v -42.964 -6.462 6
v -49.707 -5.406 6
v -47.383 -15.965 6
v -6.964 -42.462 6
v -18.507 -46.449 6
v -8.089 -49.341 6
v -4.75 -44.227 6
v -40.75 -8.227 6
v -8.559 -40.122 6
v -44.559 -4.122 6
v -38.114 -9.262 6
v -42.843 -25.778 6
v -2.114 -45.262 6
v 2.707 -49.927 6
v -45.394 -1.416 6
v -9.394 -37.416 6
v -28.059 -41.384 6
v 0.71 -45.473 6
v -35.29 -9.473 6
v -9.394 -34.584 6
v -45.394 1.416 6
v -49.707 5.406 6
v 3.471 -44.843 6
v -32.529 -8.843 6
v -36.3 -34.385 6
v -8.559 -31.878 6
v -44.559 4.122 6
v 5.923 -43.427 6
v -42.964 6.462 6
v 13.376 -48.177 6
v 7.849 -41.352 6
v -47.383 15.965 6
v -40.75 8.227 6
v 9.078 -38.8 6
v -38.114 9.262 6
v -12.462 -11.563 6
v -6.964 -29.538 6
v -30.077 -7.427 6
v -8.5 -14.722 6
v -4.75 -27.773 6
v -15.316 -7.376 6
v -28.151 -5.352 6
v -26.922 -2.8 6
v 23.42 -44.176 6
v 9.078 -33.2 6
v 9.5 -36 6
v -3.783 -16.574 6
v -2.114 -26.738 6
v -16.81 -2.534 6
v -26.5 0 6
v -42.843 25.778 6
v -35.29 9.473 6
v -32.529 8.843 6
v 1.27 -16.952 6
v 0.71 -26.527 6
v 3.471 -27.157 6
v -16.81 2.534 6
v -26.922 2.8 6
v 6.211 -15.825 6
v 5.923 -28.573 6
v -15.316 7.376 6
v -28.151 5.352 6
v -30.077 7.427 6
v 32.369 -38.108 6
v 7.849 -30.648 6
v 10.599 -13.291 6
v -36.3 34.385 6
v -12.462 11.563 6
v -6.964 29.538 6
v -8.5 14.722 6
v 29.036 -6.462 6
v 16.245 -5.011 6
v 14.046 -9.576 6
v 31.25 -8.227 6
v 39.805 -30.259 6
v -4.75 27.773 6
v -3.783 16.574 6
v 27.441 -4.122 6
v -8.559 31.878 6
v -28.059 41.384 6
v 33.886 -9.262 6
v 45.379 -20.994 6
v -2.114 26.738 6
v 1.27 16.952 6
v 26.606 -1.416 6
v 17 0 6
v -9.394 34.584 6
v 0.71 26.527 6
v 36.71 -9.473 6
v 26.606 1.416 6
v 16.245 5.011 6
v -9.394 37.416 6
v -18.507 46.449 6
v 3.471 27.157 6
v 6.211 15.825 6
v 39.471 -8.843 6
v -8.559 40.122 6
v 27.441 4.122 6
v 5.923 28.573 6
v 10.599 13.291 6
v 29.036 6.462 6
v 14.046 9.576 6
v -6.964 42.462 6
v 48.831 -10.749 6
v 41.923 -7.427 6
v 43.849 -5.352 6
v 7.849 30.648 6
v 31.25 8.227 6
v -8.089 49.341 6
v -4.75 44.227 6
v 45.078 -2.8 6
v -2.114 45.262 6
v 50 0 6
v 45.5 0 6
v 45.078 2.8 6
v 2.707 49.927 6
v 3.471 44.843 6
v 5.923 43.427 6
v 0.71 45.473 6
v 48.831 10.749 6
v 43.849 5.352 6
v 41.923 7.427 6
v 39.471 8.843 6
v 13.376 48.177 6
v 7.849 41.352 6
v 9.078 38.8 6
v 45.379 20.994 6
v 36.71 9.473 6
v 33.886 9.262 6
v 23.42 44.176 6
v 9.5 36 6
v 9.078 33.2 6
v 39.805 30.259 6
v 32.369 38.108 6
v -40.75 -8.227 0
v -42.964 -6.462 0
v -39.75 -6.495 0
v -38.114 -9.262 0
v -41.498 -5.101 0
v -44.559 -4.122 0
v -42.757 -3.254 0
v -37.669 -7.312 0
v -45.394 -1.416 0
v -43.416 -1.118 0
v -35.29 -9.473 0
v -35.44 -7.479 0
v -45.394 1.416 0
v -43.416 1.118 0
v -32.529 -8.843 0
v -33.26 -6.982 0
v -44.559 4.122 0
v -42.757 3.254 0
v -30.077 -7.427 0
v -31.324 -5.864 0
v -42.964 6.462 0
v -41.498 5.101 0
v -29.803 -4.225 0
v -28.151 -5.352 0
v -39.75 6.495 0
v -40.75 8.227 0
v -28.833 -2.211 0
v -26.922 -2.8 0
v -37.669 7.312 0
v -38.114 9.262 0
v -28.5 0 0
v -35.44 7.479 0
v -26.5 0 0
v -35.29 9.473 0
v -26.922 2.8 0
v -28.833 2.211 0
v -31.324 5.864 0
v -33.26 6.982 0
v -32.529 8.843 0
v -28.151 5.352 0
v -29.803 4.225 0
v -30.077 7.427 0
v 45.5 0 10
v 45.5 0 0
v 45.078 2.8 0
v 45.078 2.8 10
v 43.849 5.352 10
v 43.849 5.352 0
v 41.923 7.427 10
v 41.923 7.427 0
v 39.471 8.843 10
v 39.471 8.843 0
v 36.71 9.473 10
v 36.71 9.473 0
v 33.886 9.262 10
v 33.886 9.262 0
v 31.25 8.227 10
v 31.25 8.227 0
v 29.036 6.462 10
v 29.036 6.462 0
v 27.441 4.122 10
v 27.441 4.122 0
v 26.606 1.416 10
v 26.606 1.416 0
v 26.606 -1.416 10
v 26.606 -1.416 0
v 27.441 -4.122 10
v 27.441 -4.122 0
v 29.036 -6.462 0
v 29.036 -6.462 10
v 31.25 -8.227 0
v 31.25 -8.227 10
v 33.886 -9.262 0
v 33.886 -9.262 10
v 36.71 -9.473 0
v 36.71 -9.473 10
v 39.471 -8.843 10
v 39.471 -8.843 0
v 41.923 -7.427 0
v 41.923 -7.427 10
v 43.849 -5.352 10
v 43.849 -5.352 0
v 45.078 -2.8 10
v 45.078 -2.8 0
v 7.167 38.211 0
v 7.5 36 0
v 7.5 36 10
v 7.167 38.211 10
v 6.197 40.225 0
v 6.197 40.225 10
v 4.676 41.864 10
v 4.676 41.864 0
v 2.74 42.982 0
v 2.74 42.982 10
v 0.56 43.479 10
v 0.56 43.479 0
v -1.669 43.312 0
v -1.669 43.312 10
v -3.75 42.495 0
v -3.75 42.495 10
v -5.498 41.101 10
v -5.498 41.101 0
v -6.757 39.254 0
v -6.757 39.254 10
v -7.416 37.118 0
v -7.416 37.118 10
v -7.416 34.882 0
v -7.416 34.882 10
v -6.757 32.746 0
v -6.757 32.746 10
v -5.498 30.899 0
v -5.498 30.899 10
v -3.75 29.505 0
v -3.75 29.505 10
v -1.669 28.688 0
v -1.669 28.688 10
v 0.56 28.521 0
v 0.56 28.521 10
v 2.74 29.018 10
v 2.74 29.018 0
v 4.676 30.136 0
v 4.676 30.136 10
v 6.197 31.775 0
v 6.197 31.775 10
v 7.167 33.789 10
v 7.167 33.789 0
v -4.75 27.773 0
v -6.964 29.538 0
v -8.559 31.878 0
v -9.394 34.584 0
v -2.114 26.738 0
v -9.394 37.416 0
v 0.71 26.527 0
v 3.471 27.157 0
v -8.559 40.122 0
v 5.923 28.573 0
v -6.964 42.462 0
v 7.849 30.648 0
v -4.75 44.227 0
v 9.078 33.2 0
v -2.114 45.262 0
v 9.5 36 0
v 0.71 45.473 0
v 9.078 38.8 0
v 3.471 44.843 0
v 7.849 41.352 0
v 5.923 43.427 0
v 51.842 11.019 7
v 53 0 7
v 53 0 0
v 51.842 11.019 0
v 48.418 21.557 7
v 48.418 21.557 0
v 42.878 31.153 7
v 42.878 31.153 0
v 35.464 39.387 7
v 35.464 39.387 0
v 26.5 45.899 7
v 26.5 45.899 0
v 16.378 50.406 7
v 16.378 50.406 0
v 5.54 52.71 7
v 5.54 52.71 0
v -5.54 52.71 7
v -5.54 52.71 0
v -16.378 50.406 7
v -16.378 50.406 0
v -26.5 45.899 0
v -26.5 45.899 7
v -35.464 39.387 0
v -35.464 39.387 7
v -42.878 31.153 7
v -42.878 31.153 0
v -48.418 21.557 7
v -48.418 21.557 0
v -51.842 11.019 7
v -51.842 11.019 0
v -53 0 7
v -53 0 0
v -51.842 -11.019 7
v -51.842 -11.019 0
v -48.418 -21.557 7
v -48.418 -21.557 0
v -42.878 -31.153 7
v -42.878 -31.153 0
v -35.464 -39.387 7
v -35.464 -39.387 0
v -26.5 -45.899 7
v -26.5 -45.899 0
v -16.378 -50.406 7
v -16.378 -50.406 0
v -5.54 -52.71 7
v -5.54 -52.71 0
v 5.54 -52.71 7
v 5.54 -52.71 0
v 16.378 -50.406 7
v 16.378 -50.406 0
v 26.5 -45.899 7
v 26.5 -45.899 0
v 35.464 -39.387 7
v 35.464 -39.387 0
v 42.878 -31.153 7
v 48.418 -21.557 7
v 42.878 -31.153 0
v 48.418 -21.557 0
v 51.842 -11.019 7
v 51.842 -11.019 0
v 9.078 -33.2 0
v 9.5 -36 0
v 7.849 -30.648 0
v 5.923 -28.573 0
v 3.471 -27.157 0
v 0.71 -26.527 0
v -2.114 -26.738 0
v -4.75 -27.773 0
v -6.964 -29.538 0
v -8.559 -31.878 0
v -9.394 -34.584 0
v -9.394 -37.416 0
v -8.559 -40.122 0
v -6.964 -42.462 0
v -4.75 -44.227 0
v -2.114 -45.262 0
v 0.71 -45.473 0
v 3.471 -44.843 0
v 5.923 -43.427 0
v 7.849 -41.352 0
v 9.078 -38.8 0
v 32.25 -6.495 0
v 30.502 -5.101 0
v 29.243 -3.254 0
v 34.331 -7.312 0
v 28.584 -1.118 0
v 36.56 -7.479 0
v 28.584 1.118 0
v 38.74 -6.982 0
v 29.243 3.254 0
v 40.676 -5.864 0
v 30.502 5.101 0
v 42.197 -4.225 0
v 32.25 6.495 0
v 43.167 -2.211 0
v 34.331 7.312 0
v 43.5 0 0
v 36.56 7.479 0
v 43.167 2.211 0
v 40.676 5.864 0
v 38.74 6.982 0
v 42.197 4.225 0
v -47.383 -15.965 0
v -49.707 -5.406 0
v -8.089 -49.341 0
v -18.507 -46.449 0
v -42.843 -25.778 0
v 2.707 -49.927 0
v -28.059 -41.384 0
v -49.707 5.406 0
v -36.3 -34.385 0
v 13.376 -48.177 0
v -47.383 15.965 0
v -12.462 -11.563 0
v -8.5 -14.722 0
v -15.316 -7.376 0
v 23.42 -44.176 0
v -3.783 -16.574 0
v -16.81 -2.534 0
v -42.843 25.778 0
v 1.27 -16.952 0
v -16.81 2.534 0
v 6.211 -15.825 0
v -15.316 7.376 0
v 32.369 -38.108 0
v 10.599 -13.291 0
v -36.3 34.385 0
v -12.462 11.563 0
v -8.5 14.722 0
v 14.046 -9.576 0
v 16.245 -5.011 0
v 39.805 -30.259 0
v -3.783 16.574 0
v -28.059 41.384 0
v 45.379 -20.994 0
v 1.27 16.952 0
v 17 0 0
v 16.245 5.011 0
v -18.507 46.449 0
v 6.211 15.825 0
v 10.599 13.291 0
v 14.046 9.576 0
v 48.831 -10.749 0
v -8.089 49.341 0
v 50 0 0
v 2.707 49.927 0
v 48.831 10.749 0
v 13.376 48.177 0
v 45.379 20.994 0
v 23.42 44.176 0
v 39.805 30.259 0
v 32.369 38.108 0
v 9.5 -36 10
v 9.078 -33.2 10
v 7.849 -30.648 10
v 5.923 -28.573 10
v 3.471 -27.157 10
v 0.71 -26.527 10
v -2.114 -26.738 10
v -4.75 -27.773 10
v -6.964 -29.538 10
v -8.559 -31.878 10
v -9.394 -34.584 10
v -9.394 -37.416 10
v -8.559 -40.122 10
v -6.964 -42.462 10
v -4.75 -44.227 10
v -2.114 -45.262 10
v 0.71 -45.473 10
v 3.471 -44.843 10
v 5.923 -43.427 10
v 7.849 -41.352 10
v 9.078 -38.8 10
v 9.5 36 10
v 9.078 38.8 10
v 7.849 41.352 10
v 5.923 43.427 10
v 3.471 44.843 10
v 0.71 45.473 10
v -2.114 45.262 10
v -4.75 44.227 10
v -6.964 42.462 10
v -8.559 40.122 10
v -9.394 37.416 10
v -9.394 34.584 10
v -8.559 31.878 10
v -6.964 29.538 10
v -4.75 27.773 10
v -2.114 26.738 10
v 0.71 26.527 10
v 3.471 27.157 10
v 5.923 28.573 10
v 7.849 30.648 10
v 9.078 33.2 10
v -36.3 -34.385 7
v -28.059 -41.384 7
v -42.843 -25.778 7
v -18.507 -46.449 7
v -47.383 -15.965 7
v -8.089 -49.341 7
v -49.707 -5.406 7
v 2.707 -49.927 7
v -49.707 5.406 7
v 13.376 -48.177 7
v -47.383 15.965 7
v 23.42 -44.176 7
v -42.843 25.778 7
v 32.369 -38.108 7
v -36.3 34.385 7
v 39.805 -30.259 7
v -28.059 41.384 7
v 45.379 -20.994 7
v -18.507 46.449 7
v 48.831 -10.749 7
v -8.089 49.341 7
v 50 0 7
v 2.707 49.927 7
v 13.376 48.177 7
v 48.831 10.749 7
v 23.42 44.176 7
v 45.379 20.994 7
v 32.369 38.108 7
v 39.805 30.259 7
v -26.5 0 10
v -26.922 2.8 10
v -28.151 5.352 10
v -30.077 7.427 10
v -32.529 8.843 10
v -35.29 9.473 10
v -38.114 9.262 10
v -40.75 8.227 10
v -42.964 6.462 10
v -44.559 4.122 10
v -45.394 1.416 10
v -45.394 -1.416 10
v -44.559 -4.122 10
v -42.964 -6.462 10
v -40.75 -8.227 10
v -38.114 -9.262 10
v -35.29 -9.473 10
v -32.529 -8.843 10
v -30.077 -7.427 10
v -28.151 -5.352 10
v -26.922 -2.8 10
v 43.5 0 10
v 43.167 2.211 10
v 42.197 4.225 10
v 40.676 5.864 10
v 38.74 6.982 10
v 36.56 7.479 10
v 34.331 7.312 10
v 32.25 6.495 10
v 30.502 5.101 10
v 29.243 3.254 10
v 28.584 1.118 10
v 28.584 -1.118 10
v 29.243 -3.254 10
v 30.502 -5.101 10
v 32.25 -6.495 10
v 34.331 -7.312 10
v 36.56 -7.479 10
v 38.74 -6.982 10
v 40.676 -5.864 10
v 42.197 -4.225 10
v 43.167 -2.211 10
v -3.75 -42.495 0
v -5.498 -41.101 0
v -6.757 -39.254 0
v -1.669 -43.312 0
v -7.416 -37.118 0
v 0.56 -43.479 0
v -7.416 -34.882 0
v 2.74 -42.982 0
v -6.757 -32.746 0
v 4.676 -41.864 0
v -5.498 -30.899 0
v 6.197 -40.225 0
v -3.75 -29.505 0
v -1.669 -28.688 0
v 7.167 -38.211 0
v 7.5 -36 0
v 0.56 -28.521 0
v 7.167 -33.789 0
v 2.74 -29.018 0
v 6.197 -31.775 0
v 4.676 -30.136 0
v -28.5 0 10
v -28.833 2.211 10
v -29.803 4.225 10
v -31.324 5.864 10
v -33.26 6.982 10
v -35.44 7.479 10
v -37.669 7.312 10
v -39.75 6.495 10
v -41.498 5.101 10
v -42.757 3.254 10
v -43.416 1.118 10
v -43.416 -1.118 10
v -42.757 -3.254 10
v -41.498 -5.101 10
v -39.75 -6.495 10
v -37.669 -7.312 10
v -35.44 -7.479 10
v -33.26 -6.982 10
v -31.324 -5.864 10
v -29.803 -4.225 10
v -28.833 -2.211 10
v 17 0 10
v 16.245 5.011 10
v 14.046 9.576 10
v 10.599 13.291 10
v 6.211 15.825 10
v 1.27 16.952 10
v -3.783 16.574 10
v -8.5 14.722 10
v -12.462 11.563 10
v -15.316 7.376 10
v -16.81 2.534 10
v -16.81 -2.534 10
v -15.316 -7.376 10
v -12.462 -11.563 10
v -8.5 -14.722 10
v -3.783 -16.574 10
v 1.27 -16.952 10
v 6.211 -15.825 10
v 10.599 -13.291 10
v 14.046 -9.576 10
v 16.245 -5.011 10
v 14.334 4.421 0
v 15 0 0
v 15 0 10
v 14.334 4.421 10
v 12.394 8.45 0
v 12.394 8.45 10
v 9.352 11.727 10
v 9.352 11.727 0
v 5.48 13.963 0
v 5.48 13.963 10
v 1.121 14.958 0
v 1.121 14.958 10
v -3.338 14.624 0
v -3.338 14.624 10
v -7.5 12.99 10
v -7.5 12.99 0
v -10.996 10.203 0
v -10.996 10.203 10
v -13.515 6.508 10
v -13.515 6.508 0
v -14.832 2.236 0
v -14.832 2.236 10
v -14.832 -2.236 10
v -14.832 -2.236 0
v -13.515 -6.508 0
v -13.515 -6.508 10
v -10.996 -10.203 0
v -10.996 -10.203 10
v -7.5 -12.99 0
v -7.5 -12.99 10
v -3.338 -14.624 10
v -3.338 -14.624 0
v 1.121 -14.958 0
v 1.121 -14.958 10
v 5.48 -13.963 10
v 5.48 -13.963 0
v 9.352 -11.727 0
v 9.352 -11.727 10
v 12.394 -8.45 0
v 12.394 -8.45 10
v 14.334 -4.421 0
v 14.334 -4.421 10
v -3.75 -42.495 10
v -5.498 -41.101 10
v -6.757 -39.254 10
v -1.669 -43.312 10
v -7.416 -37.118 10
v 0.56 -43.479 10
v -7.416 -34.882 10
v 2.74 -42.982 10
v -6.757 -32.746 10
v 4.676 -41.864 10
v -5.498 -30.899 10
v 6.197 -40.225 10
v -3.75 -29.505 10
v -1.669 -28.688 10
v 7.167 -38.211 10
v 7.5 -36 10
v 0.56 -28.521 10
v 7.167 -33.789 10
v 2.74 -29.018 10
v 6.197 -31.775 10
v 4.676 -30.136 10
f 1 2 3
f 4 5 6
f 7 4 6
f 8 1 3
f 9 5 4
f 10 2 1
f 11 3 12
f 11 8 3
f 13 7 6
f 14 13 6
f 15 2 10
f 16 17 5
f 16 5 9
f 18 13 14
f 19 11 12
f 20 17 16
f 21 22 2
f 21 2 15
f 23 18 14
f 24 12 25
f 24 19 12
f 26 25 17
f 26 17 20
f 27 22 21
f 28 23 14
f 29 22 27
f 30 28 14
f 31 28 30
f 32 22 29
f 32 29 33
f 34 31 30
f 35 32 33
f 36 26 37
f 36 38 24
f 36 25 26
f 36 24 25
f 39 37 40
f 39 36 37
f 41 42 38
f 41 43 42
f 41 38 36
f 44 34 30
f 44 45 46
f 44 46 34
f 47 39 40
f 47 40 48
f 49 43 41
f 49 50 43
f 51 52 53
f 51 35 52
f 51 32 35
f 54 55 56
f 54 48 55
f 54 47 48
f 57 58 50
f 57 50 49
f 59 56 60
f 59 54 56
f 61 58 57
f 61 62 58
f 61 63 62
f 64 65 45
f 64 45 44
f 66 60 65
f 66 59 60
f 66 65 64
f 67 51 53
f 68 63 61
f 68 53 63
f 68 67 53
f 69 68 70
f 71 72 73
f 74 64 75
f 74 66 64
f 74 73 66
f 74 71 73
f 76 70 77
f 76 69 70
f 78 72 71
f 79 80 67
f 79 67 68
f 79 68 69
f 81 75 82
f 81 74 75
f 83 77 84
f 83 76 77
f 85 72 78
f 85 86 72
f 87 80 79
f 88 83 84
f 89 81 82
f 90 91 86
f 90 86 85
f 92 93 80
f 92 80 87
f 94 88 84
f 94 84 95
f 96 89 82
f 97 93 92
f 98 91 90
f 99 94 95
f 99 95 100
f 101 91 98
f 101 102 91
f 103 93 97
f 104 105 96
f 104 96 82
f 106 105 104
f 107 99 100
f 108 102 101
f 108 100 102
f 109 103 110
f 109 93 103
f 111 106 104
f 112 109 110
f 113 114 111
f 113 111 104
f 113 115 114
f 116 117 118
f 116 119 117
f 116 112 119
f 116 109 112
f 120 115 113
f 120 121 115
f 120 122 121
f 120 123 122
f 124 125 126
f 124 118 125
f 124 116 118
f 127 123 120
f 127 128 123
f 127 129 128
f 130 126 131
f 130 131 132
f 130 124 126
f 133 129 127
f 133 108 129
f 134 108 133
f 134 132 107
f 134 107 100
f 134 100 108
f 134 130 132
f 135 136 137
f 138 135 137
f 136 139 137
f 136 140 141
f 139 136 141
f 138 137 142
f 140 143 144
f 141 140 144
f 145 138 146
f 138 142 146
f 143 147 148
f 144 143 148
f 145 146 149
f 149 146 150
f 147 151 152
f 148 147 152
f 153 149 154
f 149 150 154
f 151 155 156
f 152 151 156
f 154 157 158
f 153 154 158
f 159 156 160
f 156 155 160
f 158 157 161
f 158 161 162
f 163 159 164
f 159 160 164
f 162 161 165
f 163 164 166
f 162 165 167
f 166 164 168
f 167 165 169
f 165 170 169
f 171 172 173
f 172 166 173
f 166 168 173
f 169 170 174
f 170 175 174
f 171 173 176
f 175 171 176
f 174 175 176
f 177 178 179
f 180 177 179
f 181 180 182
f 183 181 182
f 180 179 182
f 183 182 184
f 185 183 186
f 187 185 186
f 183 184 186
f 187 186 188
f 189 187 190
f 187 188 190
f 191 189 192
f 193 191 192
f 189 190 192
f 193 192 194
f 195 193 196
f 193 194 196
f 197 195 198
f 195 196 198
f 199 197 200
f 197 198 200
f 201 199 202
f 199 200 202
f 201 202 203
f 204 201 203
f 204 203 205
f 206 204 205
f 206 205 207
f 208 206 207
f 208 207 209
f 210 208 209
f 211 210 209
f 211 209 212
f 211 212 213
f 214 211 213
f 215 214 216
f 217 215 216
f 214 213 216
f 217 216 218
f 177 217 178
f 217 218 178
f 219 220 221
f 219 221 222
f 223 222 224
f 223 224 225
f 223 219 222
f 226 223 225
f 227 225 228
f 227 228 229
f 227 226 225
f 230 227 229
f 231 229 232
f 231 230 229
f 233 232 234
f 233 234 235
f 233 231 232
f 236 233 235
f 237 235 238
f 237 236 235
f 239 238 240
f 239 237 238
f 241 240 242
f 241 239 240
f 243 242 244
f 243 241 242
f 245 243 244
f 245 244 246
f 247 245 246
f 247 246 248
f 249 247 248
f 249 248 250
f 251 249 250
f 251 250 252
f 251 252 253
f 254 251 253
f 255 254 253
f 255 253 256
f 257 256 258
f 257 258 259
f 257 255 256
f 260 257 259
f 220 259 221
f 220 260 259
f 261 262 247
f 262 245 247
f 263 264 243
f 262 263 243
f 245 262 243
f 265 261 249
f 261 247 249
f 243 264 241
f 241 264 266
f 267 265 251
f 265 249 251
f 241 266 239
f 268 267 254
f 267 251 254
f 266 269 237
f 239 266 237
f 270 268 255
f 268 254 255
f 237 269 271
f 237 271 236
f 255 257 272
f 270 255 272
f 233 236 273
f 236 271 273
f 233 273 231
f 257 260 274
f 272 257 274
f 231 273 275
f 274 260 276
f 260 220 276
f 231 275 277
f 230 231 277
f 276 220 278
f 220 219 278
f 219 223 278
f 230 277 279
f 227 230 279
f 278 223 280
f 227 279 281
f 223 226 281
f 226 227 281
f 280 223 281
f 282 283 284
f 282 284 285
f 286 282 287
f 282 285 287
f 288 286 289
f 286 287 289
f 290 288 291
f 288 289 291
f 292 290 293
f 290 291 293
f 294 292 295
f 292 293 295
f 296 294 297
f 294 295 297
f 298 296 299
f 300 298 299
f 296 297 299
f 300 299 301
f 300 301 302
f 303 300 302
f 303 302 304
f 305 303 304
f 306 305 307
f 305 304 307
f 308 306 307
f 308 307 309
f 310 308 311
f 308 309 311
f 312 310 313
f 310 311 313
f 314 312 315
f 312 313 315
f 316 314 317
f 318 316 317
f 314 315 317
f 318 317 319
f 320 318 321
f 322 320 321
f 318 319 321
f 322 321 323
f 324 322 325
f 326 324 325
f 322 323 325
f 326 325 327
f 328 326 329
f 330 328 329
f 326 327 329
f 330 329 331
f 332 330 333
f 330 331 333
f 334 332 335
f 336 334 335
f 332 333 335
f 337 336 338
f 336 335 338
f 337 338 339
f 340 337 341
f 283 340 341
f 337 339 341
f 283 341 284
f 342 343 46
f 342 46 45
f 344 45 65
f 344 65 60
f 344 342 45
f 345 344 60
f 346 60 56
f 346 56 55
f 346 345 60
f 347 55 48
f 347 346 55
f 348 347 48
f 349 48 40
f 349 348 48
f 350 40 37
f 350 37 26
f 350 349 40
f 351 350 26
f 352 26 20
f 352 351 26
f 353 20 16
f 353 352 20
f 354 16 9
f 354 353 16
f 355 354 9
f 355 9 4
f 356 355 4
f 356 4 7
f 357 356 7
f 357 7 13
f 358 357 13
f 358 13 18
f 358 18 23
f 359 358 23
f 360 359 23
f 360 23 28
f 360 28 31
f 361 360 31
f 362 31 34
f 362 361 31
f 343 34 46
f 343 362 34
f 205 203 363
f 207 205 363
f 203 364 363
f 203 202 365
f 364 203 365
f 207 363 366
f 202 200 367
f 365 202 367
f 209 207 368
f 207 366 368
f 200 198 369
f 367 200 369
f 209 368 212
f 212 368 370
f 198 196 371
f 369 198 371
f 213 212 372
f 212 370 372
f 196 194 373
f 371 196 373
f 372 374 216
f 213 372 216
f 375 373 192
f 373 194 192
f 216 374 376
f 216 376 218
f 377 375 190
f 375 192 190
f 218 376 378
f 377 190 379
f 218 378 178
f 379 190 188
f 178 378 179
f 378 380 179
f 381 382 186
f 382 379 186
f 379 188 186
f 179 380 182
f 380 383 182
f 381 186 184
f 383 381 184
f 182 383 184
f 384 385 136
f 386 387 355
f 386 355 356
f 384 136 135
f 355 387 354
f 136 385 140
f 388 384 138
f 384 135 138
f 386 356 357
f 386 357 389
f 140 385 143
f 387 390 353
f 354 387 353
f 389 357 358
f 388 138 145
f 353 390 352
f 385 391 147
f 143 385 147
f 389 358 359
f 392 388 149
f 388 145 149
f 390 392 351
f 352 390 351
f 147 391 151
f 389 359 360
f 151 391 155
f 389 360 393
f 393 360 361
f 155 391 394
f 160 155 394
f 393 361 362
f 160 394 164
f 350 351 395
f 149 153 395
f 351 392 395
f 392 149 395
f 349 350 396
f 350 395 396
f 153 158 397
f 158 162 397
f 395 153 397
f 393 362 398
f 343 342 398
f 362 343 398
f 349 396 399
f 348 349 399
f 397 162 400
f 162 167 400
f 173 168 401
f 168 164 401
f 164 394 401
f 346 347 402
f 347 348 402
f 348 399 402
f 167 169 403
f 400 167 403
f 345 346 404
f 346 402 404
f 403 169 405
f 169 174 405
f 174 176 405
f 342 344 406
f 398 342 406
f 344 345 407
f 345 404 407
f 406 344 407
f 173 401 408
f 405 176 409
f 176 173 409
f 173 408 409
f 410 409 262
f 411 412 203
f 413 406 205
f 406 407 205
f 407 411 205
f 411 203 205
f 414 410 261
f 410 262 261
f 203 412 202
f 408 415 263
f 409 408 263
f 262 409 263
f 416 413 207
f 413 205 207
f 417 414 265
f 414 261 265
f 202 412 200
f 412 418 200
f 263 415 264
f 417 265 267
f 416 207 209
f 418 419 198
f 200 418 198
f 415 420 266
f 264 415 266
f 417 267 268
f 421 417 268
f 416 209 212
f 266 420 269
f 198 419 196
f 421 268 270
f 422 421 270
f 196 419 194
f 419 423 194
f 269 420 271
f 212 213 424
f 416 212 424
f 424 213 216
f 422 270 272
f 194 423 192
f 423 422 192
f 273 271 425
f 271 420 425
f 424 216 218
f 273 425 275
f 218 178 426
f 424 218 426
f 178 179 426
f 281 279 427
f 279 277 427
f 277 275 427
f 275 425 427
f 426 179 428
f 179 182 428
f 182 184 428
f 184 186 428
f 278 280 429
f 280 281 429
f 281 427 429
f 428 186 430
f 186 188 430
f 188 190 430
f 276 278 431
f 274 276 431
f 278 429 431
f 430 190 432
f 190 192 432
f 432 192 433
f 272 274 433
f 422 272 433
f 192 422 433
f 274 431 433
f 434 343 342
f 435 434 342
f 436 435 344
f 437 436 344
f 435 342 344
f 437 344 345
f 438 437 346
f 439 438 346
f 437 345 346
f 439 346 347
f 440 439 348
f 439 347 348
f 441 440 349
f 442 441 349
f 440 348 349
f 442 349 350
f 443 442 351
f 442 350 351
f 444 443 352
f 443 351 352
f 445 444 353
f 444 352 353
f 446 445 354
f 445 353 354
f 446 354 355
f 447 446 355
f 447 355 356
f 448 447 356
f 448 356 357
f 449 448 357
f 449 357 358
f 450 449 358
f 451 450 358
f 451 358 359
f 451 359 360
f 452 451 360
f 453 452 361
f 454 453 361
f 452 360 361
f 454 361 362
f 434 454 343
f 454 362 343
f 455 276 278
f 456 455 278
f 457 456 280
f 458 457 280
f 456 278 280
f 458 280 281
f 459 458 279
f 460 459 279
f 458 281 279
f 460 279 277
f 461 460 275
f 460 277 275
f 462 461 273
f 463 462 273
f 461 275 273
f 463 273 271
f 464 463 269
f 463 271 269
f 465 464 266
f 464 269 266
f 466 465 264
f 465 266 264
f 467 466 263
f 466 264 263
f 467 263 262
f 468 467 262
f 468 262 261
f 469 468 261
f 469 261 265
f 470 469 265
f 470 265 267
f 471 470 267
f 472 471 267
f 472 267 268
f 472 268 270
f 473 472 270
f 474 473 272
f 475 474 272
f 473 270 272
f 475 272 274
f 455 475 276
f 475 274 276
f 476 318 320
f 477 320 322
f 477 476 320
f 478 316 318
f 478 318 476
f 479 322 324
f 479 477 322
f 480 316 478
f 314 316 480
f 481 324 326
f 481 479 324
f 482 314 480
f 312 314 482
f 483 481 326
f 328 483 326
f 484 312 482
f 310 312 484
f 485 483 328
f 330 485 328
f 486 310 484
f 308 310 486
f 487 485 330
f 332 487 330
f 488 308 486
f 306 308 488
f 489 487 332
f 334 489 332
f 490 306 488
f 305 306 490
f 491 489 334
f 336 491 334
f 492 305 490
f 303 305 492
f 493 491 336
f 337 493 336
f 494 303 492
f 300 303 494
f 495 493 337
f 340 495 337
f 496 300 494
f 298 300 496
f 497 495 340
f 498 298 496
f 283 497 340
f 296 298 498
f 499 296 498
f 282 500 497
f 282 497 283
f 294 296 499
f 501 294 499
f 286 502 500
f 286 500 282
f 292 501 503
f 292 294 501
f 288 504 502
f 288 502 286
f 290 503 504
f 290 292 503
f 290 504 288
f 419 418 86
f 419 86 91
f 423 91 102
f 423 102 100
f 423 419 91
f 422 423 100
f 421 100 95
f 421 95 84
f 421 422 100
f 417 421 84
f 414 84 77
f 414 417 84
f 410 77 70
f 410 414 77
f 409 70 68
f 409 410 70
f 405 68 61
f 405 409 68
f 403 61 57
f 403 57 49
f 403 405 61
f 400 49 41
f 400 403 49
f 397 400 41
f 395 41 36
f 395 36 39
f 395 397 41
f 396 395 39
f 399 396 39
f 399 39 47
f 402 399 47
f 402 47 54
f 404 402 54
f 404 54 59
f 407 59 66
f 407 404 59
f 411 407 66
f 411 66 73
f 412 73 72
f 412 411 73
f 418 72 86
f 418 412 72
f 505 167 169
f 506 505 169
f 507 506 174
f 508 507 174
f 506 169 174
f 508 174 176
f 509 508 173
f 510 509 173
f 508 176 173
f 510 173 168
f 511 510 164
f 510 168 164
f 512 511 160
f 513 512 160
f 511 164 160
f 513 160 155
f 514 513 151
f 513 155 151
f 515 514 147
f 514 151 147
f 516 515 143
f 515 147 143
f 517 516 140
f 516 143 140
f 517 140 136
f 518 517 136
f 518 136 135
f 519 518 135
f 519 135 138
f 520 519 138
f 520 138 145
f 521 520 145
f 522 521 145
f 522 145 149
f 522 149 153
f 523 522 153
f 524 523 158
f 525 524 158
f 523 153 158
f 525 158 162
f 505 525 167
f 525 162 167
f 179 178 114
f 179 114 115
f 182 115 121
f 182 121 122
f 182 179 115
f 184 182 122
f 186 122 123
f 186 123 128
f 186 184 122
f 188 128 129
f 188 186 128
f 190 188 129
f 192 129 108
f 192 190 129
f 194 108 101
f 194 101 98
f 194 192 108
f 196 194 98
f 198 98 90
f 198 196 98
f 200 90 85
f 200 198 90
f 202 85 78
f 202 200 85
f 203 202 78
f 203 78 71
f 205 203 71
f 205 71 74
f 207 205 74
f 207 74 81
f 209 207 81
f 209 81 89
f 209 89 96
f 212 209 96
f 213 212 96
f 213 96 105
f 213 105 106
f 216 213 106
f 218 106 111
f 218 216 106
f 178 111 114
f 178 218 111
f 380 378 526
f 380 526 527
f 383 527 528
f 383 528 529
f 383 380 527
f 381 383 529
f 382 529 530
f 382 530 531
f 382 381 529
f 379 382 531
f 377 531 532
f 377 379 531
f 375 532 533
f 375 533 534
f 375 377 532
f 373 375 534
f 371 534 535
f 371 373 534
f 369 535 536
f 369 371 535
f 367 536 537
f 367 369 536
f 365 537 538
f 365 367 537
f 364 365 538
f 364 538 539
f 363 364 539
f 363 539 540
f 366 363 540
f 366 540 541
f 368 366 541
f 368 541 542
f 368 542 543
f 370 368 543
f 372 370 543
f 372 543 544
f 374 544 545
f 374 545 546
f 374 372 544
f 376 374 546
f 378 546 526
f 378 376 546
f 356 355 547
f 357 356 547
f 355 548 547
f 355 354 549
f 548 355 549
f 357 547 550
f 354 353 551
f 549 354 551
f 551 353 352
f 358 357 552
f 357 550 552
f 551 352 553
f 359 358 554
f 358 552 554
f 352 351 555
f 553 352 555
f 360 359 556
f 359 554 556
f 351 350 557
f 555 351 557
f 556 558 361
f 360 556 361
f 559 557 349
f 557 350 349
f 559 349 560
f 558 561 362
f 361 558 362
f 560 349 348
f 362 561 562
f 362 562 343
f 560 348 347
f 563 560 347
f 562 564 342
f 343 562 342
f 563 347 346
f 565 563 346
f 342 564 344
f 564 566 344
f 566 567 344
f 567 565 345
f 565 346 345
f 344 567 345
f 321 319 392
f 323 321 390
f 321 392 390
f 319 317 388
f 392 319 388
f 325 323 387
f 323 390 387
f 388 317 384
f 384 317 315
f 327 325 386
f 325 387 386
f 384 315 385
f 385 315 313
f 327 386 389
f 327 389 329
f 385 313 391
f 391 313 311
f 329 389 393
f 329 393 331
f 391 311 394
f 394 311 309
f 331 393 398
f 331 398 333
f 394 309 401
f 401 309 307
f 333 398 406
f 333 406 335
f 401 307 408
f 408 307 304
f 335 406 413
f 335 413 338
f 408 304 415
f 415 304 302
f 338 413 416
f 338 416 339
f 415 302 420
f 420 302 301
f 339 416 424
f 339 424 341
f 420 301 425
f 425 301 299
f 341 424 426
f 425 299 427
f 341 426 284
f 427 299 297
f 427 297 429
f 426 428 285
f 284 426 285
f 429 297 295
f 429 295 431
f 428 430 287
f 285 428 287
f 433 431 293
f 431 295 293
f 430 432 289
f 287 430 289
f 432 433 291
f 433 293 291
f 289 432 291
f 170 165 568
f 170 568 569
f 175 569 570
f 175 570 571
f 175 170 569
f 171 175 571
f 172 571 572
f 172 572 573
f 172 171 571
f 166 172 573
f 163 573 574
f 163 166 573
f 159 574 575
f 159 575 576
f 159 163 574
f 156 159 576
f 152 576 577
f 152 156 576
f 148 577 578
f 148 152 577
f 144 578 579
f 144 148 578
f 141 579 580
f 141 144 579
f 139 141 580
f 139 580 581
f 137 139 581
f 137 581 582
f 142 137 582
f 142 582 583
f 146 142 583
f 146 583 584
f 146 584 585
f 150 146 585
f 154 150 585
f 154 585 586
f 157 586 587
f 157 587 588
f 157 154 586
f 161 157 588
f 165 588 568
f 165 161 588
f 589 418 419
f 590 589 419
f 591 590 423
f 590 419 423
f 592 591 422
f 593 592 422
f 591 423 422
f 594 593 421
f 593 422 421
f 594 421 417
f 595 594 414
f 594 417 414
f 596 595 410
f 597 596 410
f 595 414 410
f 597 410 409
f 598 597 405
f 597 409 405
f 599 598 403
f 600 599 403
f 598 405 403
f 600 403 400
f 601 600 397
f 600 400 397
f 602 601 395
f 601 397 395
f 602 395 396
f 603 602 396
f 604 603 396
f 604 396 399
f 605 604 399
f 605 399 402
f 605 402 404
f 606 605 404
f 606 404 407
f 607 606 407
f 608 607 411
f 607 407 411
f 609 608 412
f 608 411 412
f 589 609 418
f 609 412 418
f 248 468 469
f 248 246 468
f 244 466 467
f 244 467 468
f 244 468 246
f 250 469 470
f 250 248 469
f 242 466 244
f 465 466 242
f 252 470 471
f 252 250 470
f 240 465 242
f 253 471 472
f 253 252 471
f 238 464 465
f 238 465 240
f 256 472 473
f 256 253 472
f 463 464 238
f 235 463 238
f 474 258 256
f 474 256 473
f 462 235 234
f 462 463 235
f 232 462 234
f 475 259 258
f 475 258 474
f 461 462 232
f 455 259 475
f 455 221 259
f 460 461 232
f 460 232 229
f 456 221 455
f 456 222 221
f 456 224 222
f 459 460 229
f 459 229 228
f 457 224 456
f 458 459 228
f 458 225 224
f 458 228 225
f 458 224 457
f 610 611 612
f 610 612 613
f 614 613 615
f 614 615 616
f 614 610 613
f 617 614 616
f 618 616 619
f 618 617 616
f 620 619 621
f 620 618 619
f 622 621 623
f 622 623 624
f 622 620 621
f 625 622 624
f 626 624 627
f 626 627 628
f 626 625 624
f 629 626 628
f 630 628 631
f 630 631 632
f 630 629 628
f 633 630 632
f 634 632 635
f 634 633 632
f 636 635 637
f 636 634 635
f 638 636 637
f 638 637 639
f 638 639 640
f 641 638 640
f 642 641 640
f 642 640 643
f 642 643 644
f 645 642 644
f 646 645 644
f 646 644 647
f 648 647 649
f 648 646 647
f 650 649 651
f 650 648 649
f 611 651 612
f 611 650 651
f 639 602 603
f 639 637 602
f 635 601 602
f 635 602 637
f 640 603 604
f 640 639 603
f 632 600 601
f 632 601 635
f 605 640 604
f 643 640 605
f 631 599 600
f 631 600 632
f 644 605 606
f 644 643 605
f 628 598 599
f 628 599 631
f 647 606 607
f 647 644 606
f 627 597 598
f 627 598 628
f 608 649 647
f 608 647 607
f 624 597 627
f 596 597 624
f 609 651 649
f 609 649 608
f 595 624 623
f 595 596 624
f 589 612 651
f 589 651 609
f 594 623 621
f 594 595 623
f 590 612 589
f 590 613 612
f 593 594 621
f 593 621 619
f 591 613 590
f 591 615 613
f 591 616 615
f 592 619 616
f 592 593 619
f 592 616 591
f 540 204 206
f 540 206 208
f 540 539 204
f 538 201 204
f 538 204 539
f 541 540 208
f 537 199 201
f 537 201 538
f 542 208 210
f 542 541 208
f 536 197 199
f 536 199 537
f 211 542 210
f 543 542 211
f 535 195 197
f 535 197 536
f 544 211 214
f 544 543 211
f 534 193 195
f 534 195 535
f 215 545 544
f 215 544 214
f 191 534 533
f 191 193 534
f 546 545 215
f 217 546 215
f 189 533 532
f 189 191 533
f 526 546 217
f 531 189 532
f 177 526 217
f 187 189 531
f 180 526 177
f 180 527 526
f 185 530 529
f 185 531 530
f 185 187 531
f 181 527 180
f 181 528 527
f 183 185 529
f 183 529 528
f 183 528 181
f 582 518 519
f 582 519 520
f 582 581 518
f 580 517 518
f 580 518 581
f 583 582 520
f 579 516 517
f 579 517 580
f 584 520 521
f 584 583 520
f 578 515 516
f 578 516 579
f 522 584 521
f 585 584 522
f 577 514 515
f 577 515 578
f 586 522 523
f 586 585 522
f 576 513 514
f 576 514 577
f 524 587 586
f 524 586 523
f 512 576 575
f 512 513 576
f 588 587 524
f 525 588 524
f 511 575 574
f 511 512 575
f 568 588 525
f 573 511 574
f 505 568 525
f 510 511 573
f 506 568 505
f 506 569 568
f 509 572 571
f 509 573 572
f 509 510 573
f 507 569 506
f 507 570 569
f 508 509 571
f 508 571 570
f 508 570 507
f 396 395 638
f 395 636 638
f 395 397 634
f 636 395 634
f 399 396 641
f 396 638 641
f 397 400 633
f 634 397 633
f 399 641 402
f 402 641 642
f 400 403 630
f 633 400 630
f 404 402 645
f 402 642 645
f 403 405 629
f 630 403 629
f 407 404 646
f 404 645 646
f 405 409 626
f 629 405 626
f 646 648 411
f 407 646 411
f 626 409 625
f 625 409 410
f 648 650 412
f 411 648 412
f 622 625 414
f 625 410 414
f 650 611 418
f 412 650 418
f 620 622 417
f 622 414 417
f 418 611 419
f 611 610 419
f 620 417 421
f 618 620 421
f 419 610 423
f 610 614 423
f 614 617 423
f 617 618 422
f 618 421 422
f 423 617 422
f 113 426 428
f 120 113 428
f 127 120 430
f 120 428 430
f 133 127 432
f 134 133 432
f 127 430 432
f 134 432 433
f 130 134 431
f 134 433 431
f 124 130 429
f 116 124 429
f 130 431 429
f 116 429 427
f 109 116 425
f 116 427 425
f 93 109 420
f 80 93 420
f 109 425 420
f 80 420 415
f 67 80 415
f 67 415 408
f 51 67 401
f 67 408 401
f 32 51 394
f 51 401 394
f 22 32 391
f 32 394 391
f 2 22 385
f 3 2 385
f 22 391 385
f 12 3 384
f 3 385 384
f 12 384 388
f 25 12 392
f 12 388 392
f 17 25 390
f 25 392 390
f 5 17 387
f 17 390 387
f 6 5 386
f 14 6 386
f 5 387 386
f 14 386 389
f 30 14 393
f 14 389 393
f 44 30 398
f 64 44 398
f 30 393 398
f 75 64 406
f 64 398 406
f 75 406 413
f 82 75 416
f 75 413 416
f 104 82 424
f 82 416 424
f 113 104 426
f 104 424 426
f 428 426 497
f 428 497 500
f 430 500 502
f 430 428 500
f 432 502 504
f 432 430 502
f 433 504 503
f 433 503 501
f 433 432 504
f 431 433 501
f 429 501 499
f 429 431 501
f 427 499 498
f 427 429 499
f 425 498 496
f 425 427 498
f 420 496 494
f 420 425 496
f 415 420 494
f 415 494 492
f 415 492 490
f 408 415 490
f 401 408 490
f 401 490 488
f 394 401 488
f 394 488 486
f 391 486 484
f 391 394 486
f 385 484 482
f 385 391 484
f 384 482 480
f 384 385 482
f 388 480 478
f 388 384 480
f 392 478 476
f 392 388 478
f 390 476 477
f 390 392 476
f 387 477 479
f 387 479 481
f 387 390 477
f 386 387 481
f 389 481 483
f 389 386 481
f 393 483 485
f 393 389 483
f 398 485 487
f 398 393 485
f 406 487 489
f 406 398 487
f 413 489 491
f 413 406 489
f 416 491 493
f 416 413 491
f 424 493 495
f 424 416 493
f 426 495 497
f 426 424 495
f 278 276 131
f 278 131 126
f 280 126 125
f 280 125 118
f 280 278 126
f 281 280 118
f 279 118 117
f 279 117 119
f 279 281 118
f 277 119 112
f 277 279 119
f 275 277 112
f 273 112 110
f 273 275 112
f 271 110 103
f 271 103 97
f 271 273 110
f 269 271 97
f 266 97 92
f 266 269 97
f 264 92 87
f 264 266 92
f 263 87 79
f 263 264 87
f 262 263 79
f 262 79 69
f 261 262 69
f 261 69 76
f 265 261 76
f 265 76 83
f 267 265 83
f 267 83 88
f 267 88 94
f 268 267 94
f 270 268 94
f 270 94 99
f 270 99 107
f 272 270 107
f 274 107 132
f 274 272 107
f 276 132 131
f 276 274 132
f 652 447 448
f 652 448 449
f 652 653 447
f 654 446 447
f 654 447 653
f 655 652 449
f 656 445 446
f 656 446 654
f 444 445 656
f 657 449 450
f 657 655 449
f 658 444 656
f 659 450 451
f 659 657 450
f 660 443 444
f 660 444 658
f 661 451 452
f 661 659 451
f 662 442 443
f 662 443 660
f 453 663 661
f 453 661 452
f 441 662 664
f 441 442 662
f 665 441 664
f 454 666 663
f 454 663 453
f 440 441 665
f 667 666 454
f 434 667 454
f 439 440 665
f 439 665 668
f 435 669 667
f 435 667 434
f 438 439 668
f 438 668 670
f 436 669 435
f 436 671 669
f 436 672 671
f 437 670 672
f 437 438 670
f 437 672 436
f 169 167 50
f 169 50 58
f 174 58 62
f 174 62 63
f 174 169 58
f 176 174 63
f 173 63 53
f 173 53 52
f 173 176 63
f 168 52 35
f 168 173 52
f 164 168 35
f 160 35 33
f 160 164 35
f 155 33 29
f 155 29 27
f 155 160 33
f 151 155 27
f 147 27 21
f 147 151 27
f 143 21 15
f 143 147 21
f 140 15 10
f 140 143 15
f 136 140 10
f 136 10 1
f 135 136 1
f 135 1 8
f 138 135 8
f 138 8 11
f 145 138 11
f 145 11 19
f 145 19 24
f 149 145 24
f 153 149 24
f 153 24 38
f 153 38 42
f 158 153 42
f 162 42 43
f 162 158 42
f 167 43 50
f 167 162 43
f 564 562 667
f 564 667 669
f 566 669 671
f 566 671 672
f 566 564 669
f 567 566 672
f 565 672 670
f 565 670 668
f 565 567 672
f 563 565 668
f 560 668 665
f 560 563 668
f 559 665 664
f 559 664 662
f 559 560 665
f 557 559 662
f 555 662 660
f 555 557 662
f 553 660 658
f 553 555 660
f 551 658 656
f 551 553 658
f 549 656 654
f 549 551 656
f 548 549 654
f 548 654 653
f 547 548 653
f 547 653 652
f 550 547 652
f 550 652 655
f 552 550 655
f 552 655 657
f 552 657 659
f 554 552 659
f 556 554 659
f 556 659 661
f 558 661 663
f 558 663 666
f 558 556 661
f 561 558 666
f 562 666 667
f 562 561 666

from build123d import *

# Parameters (mm, degrees)
F0_R     = 53
F0_R_2   = 50
F1_DEPTH = 7
F0_R_3   = 9.5
F0_R_4   = 7.5
F0_R_5   = 17
F0_R_6   = 15
F2_DEPTH = 10
F3_DEPTH = 6


with BuildPart() as f1:
    # F0 (on Top) → F1 (new body)
    with BuildSketch(Plane.XY):
        Circle(F0_R)
        Circle(F0_R_2, mode=Mode.SUBTRACT)
    extrude(amount=F1_DEPTH)


with BuildPart() as f2:
    # F0 (on Top) → F2 (new body)
    with BuildSketch(Plane.XY):
        with Locations((36, 0)):
            Circle(F0_R_3)
        with Locations((36, 0)):
            Circle(F0_R_4, mode=Mode.SUBTRACT)
        with Locations((-36, 0)):
            Circle(F0_R_3)
        with Locations((-36, 0)):
            Circle(F0_R_4, mode=Mode.SUBTRACT)
        with Locations((0, -36)):
            Circle(F0_R_3)
        with Locations((0, -36)):
            Circle(F0_R_4, mode=Mode.SUBTRACT)
        with Locations((0, 36)):
            Circle(F0_R_3)
        with Locations((0, 36)):
            Circle(F0_R_4, mode=Mode.SUBTRACT)
        Circle(F0_R_5)
        Circle(F0_R_6, mode=Mode.SUBTRACT)
    extrude(amount=F2_DEPTH)


with BuildPart() as f3:
    # F0 (on Top) → F3 (new body)
    with BuildSketch(Plane.XY):
        Circle(F0_R_2)
        with Locations((0, -36)):
            Circle(F0_R_3, mode=Mode.SUBTRACT)
        with Locations((-36, 0)):
            Circle(F0_R_3, mode=Mode.SUBTRACT)
        Circle(F0_R_5, mode=Mode.SUBTRACT)
        with Locations((36, 0)):
            Circle(F0_R_3, mode=Mode.SUBTRACT)
        with Locations((0, 36)):
            Circle(F0_R_3, mode=Mode.SUBTRACT)
    extrude(amount=F3_DEPTH)


solid = Compound([f1.part, f2.part, f3.part])
